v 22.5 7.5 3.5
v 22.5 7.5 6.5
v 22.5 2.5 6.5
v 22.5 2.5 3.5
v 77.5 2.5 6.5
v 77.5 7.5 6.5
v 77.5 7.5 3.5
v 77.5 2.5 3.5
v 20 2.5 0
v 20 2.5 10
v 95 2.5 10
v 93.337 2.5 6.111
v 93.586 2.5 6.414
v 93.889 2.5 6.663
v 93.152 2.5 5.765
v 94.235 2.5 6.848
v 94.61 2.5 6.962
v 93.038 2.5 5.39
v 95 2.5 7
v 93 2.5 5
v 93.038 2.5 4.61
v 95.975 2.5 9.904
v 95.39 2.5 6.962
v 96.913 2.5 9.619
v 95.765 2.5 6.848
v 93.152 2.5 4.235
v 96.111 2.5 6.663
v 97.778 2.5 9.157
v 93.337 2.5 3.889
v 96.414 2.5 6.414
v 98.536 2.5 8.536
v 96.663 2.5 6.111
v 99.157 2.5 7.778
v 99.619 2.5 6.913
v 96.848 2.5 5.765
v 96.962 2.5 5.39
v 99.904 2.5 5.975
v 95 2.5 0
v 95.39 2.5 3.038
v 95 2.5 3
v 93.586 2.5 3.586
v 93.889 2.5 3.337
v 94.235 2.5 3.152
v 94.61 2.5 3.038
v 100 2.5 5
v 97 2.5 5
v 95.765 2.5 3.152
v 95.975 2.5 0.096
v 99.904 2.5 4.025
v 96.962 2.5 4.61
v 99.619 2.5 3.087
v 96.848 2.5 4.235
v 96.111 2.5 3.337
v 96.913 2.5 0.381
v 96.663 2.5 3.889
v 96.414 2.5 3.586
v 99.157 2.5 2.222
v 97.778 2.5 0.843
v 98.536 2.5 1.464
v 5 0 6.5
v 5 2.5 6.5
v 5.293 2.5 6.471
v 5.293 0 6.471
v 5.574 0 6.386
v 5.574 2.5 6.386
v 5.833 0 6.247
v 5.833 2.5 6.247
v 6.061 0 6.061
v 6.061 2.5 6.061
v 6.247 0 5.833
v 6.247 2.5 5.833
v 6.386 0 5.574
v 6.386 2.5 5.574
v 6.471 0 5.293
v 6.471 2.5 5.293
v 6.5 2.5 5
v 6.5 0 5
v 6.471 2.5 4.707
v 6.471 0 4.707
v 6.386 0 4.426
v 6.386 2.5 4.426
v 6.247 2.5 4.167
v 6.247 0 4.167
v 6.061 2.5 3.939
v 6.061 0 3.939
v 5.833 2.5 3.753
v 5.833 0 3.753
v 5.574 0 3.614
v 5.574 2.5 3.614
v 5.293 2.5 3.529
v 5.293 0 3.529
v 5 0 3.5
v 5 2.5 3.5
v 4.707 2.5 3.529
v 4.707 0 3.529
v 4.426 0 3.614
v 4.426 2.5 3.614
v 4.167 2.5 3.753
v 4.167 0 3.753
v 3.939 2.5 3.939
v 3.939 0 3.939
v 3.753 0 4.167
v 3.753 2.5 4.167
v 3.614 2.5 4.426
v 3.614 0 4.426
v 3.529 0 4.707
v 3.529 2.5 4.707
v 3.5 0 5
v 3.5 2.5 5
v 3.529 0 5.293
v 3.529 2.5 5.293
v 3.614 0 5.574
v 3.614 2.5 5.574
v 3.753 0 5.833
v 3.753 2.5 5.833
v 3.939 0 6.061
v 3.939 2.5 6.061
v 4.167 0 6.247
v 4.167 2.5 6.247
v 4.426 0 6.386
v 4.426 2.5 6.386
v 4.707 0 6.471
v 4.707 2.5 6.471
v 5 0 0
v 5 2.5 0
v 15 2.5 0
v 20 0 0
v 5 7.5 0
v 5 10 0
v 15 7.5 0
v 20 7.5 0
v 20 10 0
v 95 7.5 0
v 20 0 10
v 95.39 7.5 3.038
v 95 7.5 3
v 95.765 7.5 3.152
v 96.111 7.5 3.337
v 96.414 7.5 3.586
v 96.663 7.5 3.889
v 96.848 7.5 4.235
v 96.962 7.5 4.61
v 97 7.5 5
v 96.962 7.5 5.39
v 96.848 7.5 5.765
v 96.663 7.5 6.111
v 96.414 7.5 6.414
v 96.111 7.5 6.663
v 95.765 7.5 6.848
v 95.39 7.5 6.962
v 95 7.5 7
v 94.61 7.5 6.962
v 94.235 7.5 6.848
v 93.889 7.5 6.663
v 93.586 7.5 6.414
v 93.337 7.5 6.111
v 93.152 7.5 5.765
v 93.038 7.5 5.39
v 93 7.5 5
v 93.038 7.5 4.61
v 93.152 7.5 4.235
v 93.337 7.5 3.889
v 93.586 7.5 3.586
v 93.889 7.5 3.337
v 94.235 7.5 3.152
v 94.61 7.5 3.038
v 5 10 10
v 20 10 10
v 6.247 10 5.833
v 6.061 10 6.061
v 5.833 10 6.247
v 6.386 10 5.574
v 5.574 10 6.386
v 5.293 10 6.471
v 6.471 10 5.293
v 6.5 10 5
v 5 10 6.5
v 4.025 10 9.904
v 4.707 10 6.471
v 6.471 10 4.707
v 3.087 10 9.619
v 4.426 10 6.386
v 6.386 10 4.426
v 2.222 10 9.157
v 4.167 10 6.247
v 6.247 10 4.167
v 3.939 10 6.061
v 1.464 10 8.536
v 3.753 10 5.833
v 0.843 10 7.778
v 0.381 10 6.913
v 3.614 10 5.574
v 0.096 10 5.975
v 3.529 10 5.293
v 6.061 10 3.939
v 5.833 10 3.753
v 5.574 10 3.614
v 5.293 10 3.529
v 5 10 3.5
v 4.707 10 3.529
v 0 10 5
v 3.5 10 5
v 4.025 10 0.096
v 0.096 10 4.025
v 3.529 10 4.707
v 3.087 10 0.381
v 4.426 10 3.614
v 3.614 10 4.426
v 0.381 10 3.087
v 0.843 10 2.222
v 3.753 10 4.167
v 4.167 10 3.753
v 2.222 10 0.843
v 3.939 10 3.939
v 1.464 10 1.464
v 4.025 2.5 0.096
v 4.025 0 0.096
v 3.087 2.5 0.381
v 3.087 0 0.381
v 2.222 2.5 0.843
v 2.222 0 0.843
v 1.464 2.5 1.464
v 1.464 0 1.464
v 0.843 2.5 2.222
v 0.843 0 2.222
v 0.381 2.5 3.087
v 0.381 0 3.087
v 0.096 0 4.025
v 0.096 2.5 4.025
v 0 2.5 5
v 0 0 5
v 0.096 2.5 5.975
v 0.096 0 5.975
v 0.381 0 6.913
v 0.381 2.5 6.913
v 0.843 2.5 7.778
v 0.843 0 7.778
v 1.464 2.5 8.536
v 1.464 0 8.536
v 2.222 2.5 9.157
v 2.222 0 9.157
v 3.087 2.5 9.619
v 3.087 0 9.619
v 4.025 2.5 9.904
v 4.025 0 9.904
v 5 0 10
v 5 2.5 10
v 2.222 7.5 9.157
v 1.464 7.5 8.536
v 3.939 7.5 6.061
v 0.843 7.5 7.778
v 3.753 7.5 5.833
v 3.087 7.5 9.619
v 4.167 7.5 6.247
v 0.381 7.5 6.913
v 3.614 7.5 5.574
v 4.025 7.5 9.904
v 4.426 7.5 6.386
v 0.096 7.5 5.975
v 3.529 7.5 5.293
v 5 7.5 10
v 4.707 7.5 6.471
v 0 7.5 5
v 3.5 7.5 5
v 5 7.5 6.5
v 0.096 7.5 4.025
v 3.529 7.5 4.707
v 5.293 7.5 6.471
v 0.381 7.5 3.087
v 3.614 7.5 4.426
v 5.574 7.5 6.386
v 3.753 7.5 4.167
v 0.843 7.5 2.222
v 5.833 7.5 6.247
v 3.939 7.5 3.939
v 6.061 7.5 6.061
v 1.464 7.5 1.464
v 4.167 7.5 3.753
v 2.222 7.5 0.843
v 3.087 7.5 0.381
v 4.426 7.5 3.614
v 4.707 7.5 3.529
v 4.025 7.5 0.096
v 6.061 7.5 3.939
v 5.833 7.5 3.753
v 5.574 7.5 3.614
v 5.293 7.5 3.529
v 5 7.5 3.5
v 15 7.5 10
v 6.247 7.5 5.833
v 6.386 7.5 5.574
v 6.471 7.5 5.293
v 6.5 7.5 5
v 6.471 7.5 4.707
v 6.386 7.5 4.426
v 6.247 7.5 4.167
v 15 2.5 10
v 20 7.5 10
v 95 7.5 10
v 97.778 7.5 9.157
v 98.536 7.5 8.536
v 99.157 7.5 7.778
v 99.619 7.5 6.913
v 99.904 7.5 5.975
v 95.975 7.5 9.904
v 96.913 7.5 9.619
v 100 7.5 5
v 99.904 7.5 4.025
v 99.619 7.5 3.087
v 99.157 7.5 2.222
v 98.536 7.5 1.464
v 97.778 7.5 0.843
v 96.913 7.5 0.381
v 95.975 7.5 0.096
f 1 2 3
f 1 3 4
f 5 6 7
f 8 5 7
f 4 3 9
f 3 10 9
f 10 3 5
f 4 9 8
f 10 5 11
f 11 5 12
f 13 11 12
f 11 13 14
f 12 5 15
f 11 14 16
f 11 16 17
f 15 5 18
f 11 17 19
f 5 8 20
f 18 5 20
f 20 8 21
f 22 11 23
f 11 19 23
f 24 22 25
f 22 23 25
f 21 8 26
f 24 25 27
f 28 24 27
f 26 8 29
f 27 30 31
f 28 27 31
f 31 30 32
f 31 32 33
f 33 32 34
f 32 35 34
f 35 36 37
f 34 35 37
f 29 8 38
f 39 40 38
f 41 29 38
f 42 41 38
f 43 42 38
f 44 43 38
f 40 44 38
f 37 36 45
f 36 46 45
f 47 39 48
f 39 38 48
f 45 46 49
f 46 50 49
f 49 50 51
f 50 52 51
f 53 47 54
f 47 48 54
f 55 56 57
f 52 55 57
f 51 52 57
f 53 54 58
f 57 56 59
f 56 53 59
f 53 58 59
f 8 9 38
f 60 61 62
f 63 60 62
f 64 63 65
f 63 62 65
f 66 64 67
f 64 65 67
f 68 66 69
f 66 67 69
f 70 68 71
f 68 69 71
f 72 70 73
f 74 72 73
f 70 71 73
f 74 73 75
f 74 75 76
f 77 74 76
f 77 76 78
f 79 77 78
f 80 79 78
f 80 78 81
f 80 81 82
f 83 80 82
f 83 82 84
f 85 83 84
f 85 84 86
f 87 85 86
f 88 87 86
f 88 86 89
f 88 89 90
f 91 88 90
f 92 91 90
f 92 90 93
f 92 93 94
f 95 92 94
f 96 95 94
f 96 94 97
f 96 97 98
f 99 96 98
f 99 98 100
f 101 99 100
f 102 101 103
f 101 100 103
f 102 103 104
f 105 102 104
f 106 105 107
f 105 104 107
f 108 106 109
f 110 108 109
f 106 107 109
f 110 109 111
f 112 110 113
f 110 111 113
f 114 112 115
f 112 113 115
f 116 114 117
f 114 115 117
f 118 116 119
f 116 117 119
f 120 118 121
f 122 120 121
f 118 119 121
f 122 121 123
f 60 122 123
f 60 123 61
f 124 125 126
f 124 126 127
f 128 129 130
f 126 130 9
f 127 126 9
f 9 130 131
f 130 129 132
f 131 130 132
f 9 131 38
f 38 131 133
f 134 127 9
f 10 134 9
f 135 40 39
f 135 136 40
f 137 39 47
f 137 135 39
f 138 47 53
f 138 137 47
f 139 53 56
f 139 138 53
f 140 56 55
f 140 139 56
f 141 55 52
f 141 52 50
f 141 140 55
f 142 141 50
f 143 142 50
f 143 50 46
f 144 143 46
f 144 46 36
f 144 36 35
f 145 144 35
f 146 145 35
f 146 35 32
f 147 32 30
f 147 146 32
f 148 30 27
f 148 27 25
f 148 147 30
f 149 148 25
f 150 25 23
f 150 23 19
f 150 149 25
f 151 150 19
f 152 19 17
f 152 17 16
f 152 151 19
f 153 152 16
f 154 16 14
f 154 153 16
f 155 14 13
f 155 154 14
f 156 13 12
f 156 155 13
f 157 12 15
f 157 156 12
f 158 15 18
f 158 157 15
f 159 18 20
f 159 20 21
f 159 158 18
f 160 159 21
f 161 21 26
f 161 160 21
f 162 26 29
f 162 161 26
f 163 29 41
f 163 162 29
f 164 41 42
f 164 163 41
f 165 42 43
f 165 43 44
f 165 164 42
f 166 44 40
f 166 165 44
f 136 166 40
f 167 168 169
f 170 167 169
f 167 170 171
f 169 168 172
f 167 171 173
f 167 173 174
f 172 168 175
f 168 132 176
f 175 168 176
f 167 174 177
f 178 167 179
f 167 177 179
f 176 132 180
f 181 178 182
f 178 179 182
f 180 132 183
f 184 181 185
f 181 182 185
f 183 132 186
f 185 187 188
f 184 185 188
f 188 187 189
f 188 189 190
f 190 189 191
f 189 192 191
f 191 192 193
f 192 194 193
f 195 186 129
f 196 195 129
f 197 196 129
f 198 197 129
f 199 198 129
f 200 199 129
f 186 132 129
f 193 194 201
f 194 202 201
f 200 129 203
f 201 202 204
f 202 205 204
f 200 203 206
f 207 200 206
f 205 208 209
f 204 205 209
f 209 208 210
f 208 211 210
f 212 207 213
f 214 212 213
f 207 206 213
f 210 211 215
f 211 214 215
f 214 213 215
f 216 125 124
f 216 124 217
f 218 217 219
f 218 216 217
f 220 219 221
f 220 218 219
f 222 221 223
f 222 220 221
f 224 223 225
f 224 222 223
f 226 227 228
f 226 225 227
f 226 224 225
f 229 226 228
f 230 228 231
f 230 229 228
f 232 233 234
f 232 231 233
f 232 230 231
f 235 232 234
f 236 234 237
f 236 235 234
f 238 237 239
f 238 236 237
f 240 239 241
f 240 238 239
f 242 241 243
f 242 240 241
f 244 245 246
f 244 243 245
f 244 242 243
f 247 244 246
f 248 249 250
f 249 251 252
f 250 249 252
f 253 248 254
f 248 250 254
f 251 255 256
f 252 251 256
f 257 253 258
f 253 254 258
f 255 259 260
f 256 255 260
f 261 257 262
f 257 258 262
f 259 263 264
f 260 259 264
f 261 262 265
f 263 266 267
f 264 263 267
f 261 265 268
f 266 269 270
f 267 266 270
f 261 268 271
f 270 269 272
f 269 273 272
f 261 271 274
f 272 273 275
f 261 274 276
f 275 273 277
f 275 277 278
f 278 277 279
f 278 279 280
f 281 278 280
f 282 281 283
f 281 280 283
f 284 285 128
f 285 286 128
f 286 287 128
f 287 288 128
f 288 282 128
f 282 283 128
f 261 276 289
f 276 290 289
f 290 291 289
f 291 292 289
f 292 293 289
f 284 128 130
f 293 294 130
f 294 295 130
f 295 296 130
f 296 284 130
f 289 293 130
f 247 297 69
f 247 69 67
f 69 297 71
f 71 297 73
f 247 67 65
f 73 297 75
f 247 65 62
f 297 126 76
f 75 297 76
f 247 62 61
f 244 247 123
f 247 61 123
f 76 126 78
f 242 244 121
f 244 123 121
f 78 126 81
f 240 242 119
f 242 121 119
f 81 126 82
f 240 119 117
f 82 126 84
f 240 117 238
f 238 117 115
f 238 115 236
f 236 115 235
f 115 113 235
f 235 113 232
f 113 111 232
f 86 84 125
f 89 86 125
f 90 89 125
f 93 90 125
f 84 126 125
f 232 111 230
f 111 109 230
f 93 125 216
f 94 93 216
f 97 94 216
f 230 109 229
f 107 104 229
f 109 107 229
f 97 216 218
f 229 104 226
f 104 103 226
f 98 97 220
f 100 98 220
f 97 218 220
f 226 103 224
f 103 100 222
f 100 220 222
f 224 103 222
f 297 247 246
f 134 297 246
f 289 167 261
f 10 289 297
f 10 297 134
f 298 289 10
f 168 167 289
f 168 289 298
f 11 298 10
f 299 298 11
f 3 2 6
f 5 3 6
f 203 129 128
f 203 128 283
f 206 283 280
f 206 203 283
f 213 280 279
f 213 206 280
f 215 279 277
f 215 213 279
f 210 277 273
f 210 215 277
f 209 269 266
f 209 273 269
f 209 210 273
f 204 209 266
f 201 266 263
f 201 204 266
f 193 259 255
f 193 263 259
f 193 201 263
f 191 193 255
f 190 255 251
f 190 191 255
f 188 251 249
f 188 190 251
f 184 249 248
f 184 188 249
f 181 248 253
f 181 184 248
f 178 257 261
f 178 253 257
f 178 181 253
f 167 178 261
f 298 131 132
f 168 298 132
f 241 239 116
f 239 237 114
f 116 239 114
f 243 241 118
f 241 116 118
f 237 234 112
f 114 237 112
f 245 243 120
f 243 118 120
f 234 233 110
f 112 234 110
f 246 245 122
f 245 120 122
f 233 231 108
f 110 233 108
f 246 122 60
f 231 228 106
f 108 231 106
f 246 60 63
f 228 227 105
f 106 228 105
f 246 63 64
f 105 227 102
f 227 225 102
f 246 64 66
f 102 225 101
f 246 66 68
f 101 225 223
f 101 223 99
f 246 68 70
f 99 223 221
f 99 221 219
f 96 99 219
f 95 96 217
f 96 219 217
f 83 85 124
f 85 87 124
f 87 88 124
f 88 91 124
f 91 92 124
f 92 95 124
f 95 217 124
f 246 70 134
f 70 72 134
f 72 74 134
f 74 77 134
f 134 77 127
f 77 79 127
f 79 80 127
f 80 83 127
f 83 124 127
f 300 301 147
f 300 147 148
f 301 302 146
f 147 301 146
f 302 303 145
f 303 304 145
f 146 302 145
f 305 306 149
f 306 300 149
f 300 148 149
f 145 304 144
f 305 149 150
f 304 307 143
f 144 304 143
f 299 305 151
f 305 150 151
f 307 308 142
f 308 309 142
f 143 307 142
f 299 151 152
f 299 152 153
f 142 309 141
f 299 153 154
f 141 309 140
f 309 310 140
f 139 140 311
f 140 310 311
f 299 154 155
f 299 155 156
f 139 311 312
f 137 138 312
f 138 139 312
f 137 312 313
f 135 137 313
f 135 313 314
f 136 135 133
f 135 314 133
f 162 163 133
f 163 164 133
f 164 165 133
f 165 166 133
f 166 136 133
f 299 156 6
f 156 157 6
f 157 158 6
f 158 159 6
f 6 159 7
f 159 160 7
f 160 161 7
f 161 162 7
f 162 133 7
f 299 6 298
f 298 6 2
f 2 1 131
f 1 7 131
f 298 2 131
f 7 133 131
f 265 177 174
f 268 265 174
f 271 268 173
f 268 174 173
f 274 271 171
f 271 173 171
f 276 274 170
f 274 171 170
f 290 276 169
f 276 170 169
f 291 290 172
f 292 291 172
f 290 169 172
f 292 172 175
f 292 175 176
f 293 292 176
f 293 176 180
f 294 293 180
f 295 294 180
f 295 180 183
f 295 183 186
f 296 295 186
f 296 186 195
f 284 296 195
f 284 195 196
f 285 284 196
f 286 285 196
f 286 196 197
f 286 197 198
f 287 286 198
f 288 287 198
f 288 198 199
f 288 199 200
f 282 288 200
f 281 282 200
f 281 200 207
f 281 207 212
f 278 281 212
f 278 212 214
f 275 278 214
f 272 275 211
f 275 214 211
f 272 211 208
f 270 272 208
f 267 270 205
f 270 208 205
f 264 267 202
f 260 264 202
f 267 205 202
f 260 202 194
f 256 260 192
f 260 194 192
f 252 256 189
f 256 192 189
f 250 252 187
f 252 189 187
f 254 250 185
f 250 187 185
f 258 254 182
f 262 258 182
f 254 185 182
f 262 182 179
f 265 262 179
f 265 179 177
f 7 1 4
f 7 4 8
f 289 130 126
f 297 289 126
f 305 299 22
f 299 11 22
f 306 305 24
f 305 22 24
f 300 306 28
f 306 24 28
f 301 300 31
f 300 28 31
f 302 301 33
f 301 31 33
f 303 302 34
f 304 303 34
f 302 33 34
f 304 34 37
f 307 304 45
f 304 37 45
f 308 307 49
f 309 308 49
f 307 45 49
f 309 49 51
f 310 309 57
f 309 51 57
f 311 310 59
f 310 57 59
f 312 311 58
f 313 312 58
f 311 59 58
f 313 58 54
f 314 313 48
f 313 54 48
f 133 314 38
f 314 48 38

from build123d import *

# Parameters (mm, degrees)
SALIENTE_EXTRUIR1_DEPTH = 10
CROQUIS2_R              = 1.5
CROQUIS2_W              = 55
CROQUIS2_H              = 3
CORTAR_EXTRUIR1_DEPTH   = 10
CROQUIS3_W              = 15
CROQUIS3_H              = 2.5
CORTAR_EXTRUIR2_DEPTH   = 10
CROQUIS4_R              = 1.5
CORTAR_EXTRUIR3_DEPTH   = 10
CORTAR_EXTRUIR5_DEPTH   = 10
CROQUIS9_R              = 2
SALIENTE_EXTRUIR2_DEPTH = 2.5
CROQUIS10_W             = 70
CROQUIS10_H             = 16.144583998
CORTAR_EXTRUIR6_DEPTH   = 10


with BuildPart() as part:
    # Croquis1 → Saliente-Extruir1 (new body)
    with BuildSketch(Plane.XY):
        Polygon((0, 0), (105, 0), (105, 2.5), (105, 7.5), (105, 10), (0, 10), (0, 7.5), (15, 7.5), (15, 2.5), (0, 2.5), align=None)
    extrude(amount=SALIENTE_EXTRUIR1_DEPTH)

    # Croquis2 → Cortar-Extruir1 (cut)
    with BuildSketch(Plane(origin=(0, 10, 0), x_dir=(1, 0, 0), z_dir=(0, 1, 0))):
        with Locations(Location((5, -5, 0), (0, 0, 270))):
            Circle(CROQUIS2_R)
        with BuildLine():
            Line((-4.031911586, 0), (5, 0))
            ThreePointArc((5, 0), (0, -5), (5, -10))
            Line((5, -10), (-4.031911586, -10))
            Line((-4.031911586, -10), (-4.031911586, 0))
        make_face()
        with Locations((50, -5)):
            Rectangle(CROQUIS2_W, CROQUIS2_H)
    extrude(amount=-CORTAR_EXTRUIR1_DEPTH, mode=Mode.SUBTRACT)

    # Croquis3 → Cortar-Extruir2 (cut)
    with BuildSketch(Plane(origin=(0, 10, 0), x_dir=(1, 0, 0), z_dir=(0, 1, 0))):
        with Locations((97.5, -1.25)):
            Rectangle(CROQUIS3_W, CROQUIS3_H)
        with Locations((97.5, -8.75)):
            Rectangle(CROQUIS3_W, CROQUIS3_H)
    extrude(amount=-CORTAR_EXTRUIR2_DEPTH, mode=Mode.SUBTRACT)

    # Croquis4 → Cortar-Extruir3 (cut)
    with BuildSketch(Plane.XY.offset(7.5)):
        with Locations((100, 5)):
            Circle(CROQUIS4_R)
        with BuildLine():
            Line((100, 10), (171.112400038, 10))
            Line((171.112400038, 10), (171.112400038, 0))
            Line((171.112400038, 0), (100, 0))
            ThreePointArc((100, 0), (105, 5), (100, 10))
        make_face()
    extrude(amount=-CORTAR_EXTRUIR3_DEPTH, mode=Mode.SUBTRACT)

    # Croquis8 → Cortar-Extruir5 (cut)
    with BuildSketch(Plane.XY.offset(7.5)):
        with BuildLine():
            Line((90, 0), (100, 0))
            ThreePointArc((100, 0), (105, 5), (100, 10))
            Line((100, 10), (90, 10))
            Line((90, 10), (90, 0))
        make_face()
    extrude(amount=-CORTAR_EXTRUIR5_DEPTH, mode=Mode.SUBTRACT)

    # Croquis9 → Saliente-Extruir2 (add, symmetric)
    with BuildSketch(Plane(origin=(0, 5, 0), x_dir=(-1, 0, 0), z_dir=(0, -1, 0))):
        with BuildLine():
            Line((-90, -10), (-95, -10))
            ThreePointArc((-95, -10), (-100, -5), (-95, 0))
            Line((-95, 0), (-90, 0))
            Line((-90, 0), (-90, -10))
        make_face()
        with Locations(Location((-95, -5, 0), (0, 0, 90))):
            Circle(CROQUIS9_R, mode=Mode.SUBTRACT)
    extrude(amount=SALIENTE_EXTRUIR2_DEPTH, both=True)

    # Croquis10 → Cortar-Extruir6 (cut)
    with BuildSketch(Plane(origin=(0, 0, 0), x_dir=(-1, 0, 0), z_dir=(0, 0, -1))):
        with Locations((-55, 15.572291999)):
            Rectangle(CROQUIS10_W, CROQUIS10_H)
        with Locations((-55, -5.572291999)):
            Rectangle(CROQUIS10_W, CROQUIS10_H)
    extrude(amount=-CORTAR_EXTRUIR6_DEPTH, mode=Mode.SUBTRACT)


solid = part.part
